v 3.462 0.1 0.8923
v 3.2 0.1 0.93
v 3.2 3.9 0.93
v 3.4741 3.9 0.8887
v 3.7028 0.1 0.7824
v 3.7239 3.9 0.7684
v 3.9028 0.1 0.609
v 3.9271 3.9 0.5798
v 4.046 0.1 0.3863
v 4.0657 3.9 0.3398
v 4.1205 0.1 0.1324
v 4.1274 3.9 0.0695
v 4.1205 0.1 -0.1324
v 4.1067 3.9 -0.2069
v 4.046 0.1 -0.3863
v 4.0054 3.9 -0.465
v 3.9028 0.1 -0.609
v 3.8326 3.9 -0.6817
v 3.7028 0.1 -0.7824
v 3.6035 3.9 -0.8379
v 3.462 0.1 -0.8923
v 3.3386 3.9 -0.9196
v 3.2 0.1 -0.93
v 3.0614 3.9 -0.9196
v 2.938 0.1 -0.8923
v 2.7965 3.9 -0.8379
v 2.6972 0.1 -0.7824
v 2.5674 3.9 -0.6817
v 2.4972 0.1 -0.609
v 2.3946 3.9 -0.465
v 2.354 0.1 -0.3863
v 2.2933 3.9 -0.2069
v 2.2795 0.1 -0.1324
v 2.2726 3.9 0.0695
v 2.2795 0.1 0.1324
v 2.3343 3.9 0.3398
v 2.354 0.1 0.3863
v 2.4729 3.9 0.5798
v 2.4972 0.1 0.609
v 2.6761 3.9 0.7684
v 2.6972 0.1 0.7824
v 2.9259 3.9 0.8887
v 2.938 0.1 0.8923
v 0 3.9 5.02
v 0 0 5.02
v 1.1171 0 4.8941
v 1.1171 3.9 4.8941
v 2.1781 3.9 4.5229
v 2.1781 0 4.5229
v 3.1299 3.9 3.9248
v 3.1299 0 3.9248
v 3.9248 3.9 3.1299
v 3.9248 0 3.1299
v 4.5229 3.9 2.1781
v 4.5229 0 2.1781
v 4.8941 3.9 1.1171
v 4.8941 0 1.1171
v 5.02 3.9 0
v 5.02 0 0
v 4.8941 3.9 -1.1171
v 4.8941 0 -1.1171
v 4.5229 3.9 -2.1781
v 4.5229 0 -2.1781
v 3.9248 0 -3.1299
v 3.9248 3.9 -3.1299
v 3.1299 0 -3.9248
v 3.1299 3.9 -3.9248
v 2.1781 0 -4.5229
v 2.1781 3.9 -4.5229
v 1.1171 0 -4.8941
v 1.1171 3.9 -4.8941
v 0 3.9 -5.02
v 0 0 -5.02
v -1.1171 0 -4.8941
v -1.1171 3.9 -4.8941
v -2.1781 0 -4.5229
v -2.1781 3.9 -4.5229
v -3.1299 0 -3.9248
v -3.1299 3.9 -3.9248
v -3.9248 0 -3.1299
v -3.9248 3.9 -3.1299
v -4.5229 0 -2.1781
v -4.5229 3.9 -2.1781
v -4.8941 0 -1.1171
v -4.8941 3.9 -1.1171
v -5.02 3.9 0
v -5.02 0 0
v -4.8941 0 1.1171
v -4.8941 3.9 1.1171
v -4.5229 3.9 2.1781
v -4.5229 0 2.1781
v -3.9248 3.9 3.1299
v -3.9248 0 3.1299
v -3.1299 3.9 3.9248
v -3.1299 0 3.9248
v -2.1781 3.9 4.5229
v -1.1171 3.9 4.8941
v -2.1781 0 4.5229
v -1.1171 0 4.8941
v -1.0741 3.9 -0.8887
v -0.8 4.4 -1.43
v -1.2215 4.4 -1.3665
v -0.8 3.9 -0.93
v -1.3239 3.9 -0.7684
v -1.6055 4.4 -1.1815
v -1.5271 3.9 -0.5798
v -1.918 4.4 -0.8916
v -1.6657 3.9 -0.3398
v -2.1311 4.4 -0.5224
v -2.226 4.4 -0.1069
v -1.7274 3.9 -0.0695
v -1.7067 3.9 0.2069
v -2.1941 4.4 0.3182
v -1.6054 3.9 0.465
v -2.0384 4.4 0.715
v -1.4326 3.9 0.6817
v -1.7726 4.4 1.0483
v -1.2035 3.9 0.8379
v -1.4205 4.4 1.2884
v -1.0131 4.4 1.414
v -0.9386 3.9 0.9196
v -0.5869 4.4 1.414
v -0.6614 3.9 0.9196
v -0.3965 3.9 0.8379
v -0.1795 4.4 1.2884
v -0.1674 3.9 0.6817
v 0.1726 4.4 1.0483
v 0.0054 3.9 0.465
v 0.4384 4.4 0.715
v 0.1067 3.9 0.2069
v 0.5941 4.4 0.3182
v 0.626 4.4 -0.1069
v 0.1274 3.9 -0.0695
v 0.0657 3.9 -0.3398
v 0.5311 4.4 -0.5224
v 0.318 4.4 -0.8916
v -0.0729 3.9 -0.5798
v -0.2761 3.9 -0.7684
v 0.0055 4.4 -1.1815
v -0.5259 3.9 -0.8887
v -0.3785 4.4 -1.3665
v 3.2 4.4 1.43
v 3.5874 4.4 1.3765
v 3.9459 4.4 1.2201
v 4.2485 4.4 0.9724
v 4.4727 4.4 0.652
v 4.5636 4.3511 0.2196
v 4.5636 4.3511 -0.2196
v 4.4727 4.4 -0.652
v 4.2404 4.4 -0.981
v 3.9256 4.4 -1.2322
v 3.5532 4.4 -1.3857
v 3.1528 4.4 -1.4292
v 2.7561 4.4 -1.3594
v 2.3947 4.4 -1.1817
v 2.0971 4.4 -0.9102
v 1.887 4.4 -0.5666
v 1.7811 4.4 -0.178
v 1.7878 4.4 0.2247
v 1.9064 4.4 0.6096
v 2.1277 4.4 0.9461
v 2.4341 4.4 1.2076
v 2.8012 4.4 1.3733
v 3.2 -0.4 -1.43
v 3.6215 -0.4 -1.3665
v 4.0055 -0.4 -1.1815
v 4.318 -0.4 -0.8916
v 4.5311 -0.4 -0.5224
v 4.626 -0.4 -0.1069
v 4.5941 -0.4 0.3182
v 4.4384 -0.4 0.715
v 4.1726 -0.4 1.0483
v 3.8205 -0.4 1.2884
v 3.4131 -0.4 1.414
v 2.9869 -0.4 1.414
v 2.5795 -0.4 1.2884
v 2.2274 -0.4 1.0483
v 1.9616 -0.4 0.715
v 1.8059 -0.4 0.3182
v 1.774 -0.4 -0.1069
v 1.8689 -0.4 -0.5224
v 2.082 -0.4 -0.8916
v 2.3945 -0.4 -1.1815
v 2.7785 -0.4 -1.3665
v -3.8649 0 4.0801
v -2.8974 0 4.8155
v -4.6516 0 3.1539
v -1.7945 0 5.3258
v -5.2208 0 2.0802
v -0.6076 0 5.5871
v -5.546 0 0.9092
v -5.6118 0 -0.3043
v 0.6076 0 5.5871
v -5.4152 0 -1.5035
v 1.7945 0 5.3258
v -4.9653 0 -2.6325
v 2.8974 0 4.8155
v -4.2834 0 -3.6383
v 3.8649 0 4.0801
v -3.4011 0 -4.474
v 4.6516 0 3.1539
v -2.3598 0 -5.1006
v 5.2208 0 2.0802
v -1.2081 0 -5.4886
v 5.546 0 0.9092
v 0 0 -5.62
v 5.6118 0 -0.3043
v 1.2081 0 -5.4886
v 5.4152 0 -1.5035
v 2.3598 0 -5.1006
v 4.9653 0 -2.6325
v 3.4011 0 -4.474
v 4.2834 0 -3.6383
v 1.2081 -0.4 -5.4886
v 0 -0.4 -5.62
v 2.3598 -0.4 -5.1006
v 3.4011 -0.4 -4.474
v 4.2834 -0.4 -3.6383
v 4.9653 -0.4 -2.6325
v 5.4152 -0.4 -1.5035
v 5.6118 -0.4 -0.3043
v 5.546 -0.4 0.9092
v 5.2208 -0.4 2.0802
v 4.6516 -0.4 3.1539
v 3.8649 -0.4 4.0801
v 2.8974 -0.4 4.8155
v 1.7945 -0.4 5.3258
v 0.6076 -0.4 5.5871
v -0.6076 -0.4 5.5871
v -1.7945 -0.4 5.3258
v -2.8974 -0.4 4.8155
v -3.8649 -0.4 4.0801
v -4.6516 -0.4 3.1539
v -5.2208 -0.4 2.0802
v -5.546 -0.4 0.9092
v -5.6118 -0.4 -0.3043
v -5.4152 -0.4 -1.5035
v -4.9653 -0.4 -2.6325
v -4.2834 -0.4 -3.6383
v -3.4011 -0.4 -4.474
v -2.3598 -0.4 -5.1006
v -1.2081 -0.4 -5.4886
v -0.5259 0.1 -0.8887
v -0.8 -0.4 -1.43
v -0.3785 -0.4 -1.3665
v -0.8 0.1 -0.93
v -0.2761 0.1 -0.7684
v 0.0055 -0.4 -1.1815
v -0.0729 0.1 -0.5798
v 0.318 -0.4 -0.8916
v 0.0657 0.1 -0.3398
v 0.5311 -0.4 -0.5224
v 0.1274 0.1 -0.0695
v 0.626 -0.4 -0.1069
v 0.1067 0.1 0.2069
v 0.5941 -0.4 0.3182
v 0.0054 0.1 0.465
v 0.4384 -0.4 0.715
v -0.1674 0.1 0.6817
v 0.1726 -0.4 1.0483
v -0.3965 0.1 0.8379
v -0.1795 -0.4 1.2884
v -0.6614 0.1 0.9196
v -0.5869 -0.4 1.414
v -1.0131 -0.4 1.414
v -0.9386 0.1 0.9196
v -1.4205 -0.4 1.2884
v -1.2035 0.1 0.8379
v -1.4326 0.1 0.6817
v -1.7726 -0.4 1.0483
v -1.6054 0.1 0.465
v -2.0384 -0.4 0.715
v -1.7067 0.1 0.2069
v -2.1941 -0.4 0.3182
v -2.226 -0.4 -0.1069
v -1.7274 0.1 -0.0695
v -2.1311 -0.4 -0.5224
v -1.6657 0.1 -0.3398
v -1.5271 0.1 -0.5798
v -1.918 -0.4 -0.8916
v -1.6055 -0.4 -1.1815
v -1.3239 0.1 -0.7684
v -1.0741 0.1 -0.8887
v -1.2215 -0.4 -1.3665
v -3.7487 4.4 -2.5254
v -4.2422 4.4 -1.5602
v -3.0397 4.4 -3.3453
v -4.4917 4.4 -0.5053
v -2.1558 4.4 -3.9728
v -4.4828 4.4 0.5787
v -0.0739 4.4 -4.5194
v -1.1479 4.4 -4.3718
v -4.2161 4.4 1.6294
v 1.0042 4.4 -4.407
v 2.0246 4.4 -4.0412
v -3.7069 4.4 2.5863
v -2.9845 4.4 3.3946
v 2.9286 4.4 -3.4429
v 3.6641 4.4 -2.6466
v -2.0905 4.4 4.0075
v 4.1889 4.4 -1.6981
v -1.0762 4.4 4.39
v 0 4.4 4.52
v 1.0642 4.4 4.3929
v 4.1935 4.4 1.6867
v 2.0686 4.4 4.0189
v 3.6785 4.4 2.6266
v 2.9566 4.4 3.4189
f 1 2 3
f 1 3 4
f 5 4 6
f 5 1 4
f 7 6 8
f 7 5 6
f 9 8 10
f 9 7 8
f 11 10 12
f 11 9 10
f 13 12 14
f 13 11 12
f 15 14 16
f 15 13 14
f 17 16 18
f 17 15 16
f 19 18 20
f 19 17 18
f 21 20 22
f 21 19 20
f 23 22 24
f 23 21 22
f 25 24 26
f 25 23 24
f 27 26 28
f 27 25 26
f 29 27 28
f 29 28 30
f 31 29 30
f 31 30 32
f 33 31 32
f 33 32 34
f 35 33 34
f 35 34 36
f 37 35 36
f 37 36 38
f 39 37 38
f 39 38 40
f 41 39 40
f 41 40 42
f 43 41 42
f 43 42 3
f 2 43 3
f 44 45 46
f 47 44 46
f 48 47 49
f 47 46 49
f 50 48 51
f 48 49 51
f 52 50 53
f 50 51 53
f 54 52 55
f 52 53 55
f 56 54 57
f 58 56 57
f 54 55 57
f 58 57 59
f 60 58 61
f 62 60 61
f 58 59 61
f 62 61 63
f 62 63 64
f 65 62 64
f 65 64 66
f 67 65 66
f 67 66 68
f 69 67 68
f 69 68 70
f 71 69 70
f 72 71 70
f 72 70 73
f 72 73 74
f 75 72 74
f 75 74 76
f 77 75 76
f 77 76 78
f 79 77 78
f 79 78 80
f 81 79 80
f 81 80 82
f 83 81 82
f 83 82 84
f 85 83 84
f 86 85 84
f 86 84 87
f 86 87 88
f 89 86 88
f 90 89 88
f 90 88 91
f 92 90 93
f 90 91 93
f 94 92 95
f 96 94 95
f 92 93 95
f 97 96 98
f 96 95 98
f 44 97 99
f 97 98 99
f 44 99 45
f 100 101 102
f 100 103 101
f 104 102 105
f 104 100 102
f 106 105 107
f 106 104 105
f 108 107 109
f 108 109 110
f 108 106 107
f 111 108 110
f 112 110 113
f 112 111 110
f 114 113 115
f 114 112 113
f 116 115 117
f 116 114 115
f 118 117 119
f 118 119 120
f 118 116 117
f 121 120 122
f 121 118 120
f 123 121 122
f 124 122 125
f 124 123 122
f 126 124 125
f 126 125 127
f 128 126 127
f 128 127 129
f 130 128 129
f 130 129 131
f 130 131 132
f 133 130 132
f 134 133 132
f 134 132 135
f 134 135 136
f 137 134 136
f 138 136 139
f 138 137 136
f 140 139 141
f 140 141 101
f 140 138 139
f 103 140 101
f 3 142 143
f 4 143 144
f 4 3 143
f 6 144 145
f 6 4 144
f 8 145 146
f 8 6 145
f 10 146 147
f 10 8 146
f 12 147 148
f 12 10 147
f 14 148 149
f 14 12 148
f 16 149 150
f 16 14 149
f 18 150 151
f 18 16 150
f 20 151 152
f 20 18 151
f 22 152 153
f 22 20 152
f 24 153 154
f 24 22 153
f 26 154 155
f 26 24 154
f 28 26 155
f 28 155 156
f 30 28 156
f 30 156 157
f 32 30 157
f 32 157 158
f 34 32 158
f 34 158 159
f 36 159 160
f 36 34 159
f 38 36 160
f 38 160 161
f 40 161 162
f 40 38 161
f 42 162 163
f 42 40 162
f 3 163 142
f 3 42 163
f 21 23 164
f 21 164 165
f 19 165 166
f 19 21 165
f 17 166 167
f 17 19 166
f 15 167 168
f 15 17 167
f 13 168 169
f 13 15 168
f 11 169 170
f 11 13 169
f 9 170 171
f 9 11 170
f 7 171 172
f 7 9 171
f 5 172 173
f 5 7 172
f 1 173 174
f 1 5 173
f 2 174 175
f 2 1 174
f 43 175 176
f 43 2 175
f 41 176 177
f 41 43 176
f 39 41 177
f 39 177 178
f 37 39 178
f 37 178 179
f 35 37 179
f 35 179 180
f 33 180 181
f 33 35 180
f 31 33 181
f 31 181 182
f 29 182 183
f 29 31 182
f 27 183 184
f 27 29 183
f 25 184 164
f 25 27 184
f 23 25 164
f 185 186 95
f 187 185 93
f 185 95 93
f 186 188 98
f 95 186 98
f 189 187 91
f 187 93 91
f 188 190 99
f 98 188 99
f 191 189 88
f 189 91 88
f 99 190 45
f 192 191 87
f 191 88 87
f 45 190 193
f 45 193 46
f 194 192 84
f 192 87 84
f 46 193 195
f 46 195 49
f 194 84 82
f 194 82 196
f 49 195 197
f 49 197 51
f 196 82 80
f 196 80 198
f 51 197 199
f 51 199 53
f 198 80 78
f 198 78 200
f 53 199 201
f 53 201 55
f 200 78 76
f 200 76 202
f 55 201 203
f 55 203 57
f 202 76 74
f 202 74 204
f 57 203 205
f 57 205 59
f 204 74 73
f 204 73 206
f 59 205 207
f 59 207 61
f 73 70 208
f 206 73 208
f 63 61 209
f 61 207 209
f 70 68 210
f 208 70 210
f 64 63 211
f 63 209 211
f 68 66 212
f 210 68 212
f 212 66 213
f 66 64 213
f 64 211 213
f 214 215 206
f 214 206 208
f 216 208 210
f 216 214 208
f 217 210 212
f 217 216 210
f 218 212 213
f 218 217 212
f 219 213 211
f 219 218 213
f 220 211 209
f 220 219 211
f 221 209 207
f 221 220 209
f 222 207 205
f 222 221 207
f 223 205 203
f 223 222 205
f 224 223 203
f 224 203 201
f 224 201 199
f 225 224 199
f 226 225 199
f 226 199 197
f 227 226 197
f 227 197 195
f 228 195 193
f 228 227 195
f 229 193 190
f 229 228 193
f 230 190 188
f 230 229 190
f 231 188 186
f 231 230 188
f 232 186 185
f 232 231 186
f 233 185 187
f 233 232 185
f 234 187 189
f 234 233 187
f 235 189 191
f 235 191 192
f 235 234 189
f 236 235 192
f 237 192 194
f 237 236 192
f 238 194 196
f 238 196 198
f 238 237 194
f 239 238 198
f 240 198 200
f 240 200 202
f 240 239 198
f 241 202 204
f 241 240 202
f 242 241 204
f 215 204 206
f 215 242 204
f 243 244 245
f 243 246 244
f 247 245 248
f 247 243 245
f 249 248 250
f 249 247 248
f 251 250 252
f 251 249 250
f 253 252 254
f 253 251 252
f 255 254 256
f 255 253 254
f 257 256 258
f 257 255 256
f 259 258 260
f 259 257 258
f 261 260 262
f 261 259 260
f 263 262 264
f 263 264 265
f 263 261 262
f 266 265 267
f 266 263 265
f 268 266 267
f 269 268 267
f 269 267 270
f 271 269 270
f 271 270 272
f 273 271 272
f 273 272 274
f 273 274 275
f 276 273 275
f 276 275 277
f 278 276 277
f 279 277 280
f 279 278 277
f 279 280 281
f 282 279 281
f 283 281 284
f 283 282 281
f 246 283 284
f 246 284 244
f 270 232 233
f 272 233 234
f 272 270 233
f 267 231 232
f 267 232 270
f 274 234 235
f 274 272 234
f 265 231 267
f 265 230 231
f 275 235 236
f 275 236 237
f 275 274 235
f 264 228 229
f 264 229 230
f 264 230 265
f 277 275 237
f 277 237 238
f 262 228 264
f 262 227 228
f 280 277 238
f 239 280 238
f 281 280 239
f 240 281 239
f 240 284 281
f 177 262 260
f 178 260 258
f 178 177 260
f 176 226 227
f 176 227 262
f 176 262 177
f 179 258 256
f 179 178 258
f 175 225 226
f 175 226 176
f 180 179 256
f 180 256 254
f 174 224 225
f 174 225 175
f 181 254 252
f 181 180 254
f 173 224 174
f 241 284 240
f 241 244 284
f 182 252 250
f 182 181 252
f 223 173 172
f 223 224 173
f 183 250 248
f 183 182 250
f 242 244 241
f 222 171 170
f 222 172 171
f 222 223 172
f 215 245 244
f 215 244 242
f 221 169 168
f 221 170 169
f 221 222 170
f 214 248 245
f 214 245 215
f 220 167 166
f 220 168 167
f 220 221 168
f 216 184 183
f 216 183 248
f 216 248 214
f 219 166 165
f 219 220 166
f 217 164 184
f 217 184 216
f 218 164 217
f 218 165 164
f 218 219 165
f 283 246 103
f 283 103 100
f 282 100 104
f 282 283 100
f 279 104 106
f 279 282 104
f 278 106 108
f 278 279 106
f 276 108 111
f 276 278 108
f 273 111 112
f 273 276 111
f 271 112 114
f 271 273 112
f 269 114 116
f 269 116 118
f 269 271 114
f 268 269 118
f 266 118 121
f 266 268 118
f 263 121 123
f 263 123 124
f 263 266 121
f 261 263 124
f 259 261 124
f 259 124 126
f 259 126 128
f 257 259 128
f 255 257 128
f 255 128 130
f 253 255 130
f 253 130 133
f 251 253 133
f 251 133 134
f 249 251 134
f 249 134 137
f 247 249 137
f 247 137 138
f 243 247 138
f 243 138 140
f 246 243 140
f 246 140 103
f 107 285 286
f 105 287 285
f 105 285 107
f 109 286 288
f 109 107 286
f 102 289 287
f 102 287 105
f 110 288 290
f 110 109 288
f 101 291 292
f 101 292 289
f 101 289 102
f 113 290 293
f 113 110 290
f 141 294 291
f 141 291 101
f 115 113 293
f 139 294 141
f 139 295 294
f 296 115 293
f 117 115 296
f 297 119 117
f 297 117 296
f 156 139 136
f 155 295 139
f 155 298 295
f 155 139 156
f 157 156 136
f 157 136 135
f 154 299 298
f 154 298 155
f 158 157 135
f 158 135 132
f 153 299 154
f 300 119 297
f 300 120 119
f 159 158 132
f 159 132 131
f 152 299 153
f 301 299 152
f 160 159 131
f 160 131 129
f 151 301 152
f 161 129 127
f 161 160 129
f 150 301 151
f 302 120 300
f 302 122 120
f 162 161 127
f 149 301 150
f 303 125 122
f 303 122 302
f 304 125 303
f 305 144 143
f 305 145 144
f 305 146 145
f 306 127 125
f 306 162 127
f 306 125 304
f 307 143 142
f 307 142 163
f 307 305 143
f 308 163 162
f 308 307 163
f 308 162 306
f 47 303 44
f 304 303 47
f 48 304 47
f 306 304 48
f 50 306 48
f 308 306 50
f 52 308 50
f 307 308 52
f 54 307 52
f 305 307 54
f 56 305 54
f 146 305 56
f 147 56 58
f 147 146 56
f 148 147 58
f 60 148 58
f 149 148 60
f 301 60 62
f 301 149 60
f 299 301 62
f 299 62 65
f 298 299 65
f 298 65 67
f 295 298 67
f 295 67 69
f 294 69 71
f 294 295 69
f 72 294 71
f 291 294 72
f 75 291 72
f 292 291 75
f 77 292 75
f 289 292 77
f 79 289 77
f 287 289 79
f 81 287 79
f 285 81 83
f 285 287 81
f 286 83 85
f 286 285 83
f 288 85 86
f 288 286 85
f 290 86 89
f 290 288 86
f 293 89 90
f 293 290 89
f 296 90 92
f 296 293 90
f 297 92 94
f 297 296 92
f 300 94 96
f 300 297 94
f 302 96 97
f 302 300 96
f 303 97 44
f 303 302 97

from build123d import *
from build123d.topology import SkipClean

# Parameters (mm, degrees)
SKETCH_1_R      = 5.02
SKETCH_1_R_2    = 0.93
EXTRUDE_1_DEPTH = 4.4
EXTRUDE_START   = 0.4
SKETCH_3_R      = 5.62
SKETCH_3_R_2    = 0.93
EXTRUDE_2_DEPTH = 0.4
CHAMFER_1_SIZE  = 0.5


with BuildPart() as part:
    # 草图1 → 凸台-拉伸1 (new body)
    with BuildSketch(Plane(origin=(0, 0, 0), x_dir=(1, 0, 0), z_dir=(0, 1, 0))):
        with Locations(Location((0, 0, 0), (0, 0, 270))):
            Circle(SKETCH_1_R)
        with Locations(Location((3.2, 0, 0), (0, 0, 270))):
            Circle(SKETCH_1_R_2, mode=Mode.SUBTRACT)
        with Locations(Location((-0.8, 0, 0), (0, 0, 90))):
            Circle(SKETCH_1_R_2, mode=Mode.SUBTRACT)
    extrude(amount=EXTRUDE_1_DEPTH)

    # 草图3 → 凸台-拉伸2 (add)
    with SkipClean():  # the faces are left unmerged after this step: merging them gives an invalid solid
        with BuildSketch(Plane.XZ.offset(EXTRUDE_START)):
            with Locations(Location((0, 0, 0), (0, 0, 270))):
                Circle(SKETCH_3_R)
            with Locations(Location((3.2, 0, 0), (0, 0, 270))):
                Circle(SKETCH_3_R_2, mode=Mode.SUBTRACT)
            with Locations(Location((-0.8, 0, 0), (0, 0, 270))):
                Circle(SKETCH_3_R_2, mode=Mode.SUBTRACT)
        extrude(amount=-EXTRUDE_2_DEPTH)

    # 倒角1
    # the kernel refuses this chamfer: 0.5 mm, written as the material it takes off along each edge
    with BuildSketch(Plane(origin=(3.2, -0.4, 0), x_dir=(0, 0, -1), z_dir=(-1, 0, 0))) as chamfer_1_piece_1:
        Polygon((0.93 + CHAMFER_1_SIZE, 0), (0.93, -CHAMFER_1_SIZE), (0.93, 0), align=None)
    revolve(axis=Axis((3.2, -0.4, 0), (0, -1, 0)), mode=Mode.SUBTRACT)
    with BuildSketch(Plane(origin=(-0.8, -0.4, 0), x_dir=(0, 0, -1), z_dir=(-1, 0, 0))) as chamfer_1_piece_2:
        Polygon((0.93 + CHAMFER_1_SIZE, 0), (0.93, -CHAMFER_1_SIZE), (0.93, 0), align=None)
    revolve(axis=Axis((-0.8, -0.4, 0), (0, -1, 0)), mode=Mode.SUBTRACT)
    with BuildSketch(Plane(origin=(0, 4.4, 0), x_dir=(0, 0, 1), z_dir=(-1, 0, 0))) as chamfer_1_piece_3:
        Polygon((5.02, -CHAMFER_1_SIZE), (5.02 - CHAMFER_1_SIZE, 0), (5.02, 0), align=None)
    revolve(axis=Axis((0, 4.4, 0), (0, 1, 0)), mode=Mode.SUBTRACT)
    with BuildSketch(Plane(origin=(3.2, 4.4, 0), x_dir=(0, 0, 1), z_dir=(-1, 0, 0))) as chamfer_1_piece_4:
        Polygon((0.93 + CHAMFER_1_SIZE, 0), (0.93, -CHAMFER_1_SIZE), (0.93, 0), align=None)
    revolve(axis=Axis((3.2, 4.4, 0), (0, 1, 0)), mode=Mode.SUBTRACT)
    with BuildSketch(Plane(origin=(-0.8, 4.4, 0), x_dir=(0, 0, -1), z_dir=(1, 0, 0))) as chamfer_1_piece_5:
        Polygon((0.93 + CHAMFER_1_SIZE, 0), (0.93, -CHAMFER_1_SIZE), (0.93, 0), align=None)
    revolve(axis=Axis((-0.8, 4.4, 0), (0, 1, 0)), mode=Mode.SUBTRACT)


solid = part.part
